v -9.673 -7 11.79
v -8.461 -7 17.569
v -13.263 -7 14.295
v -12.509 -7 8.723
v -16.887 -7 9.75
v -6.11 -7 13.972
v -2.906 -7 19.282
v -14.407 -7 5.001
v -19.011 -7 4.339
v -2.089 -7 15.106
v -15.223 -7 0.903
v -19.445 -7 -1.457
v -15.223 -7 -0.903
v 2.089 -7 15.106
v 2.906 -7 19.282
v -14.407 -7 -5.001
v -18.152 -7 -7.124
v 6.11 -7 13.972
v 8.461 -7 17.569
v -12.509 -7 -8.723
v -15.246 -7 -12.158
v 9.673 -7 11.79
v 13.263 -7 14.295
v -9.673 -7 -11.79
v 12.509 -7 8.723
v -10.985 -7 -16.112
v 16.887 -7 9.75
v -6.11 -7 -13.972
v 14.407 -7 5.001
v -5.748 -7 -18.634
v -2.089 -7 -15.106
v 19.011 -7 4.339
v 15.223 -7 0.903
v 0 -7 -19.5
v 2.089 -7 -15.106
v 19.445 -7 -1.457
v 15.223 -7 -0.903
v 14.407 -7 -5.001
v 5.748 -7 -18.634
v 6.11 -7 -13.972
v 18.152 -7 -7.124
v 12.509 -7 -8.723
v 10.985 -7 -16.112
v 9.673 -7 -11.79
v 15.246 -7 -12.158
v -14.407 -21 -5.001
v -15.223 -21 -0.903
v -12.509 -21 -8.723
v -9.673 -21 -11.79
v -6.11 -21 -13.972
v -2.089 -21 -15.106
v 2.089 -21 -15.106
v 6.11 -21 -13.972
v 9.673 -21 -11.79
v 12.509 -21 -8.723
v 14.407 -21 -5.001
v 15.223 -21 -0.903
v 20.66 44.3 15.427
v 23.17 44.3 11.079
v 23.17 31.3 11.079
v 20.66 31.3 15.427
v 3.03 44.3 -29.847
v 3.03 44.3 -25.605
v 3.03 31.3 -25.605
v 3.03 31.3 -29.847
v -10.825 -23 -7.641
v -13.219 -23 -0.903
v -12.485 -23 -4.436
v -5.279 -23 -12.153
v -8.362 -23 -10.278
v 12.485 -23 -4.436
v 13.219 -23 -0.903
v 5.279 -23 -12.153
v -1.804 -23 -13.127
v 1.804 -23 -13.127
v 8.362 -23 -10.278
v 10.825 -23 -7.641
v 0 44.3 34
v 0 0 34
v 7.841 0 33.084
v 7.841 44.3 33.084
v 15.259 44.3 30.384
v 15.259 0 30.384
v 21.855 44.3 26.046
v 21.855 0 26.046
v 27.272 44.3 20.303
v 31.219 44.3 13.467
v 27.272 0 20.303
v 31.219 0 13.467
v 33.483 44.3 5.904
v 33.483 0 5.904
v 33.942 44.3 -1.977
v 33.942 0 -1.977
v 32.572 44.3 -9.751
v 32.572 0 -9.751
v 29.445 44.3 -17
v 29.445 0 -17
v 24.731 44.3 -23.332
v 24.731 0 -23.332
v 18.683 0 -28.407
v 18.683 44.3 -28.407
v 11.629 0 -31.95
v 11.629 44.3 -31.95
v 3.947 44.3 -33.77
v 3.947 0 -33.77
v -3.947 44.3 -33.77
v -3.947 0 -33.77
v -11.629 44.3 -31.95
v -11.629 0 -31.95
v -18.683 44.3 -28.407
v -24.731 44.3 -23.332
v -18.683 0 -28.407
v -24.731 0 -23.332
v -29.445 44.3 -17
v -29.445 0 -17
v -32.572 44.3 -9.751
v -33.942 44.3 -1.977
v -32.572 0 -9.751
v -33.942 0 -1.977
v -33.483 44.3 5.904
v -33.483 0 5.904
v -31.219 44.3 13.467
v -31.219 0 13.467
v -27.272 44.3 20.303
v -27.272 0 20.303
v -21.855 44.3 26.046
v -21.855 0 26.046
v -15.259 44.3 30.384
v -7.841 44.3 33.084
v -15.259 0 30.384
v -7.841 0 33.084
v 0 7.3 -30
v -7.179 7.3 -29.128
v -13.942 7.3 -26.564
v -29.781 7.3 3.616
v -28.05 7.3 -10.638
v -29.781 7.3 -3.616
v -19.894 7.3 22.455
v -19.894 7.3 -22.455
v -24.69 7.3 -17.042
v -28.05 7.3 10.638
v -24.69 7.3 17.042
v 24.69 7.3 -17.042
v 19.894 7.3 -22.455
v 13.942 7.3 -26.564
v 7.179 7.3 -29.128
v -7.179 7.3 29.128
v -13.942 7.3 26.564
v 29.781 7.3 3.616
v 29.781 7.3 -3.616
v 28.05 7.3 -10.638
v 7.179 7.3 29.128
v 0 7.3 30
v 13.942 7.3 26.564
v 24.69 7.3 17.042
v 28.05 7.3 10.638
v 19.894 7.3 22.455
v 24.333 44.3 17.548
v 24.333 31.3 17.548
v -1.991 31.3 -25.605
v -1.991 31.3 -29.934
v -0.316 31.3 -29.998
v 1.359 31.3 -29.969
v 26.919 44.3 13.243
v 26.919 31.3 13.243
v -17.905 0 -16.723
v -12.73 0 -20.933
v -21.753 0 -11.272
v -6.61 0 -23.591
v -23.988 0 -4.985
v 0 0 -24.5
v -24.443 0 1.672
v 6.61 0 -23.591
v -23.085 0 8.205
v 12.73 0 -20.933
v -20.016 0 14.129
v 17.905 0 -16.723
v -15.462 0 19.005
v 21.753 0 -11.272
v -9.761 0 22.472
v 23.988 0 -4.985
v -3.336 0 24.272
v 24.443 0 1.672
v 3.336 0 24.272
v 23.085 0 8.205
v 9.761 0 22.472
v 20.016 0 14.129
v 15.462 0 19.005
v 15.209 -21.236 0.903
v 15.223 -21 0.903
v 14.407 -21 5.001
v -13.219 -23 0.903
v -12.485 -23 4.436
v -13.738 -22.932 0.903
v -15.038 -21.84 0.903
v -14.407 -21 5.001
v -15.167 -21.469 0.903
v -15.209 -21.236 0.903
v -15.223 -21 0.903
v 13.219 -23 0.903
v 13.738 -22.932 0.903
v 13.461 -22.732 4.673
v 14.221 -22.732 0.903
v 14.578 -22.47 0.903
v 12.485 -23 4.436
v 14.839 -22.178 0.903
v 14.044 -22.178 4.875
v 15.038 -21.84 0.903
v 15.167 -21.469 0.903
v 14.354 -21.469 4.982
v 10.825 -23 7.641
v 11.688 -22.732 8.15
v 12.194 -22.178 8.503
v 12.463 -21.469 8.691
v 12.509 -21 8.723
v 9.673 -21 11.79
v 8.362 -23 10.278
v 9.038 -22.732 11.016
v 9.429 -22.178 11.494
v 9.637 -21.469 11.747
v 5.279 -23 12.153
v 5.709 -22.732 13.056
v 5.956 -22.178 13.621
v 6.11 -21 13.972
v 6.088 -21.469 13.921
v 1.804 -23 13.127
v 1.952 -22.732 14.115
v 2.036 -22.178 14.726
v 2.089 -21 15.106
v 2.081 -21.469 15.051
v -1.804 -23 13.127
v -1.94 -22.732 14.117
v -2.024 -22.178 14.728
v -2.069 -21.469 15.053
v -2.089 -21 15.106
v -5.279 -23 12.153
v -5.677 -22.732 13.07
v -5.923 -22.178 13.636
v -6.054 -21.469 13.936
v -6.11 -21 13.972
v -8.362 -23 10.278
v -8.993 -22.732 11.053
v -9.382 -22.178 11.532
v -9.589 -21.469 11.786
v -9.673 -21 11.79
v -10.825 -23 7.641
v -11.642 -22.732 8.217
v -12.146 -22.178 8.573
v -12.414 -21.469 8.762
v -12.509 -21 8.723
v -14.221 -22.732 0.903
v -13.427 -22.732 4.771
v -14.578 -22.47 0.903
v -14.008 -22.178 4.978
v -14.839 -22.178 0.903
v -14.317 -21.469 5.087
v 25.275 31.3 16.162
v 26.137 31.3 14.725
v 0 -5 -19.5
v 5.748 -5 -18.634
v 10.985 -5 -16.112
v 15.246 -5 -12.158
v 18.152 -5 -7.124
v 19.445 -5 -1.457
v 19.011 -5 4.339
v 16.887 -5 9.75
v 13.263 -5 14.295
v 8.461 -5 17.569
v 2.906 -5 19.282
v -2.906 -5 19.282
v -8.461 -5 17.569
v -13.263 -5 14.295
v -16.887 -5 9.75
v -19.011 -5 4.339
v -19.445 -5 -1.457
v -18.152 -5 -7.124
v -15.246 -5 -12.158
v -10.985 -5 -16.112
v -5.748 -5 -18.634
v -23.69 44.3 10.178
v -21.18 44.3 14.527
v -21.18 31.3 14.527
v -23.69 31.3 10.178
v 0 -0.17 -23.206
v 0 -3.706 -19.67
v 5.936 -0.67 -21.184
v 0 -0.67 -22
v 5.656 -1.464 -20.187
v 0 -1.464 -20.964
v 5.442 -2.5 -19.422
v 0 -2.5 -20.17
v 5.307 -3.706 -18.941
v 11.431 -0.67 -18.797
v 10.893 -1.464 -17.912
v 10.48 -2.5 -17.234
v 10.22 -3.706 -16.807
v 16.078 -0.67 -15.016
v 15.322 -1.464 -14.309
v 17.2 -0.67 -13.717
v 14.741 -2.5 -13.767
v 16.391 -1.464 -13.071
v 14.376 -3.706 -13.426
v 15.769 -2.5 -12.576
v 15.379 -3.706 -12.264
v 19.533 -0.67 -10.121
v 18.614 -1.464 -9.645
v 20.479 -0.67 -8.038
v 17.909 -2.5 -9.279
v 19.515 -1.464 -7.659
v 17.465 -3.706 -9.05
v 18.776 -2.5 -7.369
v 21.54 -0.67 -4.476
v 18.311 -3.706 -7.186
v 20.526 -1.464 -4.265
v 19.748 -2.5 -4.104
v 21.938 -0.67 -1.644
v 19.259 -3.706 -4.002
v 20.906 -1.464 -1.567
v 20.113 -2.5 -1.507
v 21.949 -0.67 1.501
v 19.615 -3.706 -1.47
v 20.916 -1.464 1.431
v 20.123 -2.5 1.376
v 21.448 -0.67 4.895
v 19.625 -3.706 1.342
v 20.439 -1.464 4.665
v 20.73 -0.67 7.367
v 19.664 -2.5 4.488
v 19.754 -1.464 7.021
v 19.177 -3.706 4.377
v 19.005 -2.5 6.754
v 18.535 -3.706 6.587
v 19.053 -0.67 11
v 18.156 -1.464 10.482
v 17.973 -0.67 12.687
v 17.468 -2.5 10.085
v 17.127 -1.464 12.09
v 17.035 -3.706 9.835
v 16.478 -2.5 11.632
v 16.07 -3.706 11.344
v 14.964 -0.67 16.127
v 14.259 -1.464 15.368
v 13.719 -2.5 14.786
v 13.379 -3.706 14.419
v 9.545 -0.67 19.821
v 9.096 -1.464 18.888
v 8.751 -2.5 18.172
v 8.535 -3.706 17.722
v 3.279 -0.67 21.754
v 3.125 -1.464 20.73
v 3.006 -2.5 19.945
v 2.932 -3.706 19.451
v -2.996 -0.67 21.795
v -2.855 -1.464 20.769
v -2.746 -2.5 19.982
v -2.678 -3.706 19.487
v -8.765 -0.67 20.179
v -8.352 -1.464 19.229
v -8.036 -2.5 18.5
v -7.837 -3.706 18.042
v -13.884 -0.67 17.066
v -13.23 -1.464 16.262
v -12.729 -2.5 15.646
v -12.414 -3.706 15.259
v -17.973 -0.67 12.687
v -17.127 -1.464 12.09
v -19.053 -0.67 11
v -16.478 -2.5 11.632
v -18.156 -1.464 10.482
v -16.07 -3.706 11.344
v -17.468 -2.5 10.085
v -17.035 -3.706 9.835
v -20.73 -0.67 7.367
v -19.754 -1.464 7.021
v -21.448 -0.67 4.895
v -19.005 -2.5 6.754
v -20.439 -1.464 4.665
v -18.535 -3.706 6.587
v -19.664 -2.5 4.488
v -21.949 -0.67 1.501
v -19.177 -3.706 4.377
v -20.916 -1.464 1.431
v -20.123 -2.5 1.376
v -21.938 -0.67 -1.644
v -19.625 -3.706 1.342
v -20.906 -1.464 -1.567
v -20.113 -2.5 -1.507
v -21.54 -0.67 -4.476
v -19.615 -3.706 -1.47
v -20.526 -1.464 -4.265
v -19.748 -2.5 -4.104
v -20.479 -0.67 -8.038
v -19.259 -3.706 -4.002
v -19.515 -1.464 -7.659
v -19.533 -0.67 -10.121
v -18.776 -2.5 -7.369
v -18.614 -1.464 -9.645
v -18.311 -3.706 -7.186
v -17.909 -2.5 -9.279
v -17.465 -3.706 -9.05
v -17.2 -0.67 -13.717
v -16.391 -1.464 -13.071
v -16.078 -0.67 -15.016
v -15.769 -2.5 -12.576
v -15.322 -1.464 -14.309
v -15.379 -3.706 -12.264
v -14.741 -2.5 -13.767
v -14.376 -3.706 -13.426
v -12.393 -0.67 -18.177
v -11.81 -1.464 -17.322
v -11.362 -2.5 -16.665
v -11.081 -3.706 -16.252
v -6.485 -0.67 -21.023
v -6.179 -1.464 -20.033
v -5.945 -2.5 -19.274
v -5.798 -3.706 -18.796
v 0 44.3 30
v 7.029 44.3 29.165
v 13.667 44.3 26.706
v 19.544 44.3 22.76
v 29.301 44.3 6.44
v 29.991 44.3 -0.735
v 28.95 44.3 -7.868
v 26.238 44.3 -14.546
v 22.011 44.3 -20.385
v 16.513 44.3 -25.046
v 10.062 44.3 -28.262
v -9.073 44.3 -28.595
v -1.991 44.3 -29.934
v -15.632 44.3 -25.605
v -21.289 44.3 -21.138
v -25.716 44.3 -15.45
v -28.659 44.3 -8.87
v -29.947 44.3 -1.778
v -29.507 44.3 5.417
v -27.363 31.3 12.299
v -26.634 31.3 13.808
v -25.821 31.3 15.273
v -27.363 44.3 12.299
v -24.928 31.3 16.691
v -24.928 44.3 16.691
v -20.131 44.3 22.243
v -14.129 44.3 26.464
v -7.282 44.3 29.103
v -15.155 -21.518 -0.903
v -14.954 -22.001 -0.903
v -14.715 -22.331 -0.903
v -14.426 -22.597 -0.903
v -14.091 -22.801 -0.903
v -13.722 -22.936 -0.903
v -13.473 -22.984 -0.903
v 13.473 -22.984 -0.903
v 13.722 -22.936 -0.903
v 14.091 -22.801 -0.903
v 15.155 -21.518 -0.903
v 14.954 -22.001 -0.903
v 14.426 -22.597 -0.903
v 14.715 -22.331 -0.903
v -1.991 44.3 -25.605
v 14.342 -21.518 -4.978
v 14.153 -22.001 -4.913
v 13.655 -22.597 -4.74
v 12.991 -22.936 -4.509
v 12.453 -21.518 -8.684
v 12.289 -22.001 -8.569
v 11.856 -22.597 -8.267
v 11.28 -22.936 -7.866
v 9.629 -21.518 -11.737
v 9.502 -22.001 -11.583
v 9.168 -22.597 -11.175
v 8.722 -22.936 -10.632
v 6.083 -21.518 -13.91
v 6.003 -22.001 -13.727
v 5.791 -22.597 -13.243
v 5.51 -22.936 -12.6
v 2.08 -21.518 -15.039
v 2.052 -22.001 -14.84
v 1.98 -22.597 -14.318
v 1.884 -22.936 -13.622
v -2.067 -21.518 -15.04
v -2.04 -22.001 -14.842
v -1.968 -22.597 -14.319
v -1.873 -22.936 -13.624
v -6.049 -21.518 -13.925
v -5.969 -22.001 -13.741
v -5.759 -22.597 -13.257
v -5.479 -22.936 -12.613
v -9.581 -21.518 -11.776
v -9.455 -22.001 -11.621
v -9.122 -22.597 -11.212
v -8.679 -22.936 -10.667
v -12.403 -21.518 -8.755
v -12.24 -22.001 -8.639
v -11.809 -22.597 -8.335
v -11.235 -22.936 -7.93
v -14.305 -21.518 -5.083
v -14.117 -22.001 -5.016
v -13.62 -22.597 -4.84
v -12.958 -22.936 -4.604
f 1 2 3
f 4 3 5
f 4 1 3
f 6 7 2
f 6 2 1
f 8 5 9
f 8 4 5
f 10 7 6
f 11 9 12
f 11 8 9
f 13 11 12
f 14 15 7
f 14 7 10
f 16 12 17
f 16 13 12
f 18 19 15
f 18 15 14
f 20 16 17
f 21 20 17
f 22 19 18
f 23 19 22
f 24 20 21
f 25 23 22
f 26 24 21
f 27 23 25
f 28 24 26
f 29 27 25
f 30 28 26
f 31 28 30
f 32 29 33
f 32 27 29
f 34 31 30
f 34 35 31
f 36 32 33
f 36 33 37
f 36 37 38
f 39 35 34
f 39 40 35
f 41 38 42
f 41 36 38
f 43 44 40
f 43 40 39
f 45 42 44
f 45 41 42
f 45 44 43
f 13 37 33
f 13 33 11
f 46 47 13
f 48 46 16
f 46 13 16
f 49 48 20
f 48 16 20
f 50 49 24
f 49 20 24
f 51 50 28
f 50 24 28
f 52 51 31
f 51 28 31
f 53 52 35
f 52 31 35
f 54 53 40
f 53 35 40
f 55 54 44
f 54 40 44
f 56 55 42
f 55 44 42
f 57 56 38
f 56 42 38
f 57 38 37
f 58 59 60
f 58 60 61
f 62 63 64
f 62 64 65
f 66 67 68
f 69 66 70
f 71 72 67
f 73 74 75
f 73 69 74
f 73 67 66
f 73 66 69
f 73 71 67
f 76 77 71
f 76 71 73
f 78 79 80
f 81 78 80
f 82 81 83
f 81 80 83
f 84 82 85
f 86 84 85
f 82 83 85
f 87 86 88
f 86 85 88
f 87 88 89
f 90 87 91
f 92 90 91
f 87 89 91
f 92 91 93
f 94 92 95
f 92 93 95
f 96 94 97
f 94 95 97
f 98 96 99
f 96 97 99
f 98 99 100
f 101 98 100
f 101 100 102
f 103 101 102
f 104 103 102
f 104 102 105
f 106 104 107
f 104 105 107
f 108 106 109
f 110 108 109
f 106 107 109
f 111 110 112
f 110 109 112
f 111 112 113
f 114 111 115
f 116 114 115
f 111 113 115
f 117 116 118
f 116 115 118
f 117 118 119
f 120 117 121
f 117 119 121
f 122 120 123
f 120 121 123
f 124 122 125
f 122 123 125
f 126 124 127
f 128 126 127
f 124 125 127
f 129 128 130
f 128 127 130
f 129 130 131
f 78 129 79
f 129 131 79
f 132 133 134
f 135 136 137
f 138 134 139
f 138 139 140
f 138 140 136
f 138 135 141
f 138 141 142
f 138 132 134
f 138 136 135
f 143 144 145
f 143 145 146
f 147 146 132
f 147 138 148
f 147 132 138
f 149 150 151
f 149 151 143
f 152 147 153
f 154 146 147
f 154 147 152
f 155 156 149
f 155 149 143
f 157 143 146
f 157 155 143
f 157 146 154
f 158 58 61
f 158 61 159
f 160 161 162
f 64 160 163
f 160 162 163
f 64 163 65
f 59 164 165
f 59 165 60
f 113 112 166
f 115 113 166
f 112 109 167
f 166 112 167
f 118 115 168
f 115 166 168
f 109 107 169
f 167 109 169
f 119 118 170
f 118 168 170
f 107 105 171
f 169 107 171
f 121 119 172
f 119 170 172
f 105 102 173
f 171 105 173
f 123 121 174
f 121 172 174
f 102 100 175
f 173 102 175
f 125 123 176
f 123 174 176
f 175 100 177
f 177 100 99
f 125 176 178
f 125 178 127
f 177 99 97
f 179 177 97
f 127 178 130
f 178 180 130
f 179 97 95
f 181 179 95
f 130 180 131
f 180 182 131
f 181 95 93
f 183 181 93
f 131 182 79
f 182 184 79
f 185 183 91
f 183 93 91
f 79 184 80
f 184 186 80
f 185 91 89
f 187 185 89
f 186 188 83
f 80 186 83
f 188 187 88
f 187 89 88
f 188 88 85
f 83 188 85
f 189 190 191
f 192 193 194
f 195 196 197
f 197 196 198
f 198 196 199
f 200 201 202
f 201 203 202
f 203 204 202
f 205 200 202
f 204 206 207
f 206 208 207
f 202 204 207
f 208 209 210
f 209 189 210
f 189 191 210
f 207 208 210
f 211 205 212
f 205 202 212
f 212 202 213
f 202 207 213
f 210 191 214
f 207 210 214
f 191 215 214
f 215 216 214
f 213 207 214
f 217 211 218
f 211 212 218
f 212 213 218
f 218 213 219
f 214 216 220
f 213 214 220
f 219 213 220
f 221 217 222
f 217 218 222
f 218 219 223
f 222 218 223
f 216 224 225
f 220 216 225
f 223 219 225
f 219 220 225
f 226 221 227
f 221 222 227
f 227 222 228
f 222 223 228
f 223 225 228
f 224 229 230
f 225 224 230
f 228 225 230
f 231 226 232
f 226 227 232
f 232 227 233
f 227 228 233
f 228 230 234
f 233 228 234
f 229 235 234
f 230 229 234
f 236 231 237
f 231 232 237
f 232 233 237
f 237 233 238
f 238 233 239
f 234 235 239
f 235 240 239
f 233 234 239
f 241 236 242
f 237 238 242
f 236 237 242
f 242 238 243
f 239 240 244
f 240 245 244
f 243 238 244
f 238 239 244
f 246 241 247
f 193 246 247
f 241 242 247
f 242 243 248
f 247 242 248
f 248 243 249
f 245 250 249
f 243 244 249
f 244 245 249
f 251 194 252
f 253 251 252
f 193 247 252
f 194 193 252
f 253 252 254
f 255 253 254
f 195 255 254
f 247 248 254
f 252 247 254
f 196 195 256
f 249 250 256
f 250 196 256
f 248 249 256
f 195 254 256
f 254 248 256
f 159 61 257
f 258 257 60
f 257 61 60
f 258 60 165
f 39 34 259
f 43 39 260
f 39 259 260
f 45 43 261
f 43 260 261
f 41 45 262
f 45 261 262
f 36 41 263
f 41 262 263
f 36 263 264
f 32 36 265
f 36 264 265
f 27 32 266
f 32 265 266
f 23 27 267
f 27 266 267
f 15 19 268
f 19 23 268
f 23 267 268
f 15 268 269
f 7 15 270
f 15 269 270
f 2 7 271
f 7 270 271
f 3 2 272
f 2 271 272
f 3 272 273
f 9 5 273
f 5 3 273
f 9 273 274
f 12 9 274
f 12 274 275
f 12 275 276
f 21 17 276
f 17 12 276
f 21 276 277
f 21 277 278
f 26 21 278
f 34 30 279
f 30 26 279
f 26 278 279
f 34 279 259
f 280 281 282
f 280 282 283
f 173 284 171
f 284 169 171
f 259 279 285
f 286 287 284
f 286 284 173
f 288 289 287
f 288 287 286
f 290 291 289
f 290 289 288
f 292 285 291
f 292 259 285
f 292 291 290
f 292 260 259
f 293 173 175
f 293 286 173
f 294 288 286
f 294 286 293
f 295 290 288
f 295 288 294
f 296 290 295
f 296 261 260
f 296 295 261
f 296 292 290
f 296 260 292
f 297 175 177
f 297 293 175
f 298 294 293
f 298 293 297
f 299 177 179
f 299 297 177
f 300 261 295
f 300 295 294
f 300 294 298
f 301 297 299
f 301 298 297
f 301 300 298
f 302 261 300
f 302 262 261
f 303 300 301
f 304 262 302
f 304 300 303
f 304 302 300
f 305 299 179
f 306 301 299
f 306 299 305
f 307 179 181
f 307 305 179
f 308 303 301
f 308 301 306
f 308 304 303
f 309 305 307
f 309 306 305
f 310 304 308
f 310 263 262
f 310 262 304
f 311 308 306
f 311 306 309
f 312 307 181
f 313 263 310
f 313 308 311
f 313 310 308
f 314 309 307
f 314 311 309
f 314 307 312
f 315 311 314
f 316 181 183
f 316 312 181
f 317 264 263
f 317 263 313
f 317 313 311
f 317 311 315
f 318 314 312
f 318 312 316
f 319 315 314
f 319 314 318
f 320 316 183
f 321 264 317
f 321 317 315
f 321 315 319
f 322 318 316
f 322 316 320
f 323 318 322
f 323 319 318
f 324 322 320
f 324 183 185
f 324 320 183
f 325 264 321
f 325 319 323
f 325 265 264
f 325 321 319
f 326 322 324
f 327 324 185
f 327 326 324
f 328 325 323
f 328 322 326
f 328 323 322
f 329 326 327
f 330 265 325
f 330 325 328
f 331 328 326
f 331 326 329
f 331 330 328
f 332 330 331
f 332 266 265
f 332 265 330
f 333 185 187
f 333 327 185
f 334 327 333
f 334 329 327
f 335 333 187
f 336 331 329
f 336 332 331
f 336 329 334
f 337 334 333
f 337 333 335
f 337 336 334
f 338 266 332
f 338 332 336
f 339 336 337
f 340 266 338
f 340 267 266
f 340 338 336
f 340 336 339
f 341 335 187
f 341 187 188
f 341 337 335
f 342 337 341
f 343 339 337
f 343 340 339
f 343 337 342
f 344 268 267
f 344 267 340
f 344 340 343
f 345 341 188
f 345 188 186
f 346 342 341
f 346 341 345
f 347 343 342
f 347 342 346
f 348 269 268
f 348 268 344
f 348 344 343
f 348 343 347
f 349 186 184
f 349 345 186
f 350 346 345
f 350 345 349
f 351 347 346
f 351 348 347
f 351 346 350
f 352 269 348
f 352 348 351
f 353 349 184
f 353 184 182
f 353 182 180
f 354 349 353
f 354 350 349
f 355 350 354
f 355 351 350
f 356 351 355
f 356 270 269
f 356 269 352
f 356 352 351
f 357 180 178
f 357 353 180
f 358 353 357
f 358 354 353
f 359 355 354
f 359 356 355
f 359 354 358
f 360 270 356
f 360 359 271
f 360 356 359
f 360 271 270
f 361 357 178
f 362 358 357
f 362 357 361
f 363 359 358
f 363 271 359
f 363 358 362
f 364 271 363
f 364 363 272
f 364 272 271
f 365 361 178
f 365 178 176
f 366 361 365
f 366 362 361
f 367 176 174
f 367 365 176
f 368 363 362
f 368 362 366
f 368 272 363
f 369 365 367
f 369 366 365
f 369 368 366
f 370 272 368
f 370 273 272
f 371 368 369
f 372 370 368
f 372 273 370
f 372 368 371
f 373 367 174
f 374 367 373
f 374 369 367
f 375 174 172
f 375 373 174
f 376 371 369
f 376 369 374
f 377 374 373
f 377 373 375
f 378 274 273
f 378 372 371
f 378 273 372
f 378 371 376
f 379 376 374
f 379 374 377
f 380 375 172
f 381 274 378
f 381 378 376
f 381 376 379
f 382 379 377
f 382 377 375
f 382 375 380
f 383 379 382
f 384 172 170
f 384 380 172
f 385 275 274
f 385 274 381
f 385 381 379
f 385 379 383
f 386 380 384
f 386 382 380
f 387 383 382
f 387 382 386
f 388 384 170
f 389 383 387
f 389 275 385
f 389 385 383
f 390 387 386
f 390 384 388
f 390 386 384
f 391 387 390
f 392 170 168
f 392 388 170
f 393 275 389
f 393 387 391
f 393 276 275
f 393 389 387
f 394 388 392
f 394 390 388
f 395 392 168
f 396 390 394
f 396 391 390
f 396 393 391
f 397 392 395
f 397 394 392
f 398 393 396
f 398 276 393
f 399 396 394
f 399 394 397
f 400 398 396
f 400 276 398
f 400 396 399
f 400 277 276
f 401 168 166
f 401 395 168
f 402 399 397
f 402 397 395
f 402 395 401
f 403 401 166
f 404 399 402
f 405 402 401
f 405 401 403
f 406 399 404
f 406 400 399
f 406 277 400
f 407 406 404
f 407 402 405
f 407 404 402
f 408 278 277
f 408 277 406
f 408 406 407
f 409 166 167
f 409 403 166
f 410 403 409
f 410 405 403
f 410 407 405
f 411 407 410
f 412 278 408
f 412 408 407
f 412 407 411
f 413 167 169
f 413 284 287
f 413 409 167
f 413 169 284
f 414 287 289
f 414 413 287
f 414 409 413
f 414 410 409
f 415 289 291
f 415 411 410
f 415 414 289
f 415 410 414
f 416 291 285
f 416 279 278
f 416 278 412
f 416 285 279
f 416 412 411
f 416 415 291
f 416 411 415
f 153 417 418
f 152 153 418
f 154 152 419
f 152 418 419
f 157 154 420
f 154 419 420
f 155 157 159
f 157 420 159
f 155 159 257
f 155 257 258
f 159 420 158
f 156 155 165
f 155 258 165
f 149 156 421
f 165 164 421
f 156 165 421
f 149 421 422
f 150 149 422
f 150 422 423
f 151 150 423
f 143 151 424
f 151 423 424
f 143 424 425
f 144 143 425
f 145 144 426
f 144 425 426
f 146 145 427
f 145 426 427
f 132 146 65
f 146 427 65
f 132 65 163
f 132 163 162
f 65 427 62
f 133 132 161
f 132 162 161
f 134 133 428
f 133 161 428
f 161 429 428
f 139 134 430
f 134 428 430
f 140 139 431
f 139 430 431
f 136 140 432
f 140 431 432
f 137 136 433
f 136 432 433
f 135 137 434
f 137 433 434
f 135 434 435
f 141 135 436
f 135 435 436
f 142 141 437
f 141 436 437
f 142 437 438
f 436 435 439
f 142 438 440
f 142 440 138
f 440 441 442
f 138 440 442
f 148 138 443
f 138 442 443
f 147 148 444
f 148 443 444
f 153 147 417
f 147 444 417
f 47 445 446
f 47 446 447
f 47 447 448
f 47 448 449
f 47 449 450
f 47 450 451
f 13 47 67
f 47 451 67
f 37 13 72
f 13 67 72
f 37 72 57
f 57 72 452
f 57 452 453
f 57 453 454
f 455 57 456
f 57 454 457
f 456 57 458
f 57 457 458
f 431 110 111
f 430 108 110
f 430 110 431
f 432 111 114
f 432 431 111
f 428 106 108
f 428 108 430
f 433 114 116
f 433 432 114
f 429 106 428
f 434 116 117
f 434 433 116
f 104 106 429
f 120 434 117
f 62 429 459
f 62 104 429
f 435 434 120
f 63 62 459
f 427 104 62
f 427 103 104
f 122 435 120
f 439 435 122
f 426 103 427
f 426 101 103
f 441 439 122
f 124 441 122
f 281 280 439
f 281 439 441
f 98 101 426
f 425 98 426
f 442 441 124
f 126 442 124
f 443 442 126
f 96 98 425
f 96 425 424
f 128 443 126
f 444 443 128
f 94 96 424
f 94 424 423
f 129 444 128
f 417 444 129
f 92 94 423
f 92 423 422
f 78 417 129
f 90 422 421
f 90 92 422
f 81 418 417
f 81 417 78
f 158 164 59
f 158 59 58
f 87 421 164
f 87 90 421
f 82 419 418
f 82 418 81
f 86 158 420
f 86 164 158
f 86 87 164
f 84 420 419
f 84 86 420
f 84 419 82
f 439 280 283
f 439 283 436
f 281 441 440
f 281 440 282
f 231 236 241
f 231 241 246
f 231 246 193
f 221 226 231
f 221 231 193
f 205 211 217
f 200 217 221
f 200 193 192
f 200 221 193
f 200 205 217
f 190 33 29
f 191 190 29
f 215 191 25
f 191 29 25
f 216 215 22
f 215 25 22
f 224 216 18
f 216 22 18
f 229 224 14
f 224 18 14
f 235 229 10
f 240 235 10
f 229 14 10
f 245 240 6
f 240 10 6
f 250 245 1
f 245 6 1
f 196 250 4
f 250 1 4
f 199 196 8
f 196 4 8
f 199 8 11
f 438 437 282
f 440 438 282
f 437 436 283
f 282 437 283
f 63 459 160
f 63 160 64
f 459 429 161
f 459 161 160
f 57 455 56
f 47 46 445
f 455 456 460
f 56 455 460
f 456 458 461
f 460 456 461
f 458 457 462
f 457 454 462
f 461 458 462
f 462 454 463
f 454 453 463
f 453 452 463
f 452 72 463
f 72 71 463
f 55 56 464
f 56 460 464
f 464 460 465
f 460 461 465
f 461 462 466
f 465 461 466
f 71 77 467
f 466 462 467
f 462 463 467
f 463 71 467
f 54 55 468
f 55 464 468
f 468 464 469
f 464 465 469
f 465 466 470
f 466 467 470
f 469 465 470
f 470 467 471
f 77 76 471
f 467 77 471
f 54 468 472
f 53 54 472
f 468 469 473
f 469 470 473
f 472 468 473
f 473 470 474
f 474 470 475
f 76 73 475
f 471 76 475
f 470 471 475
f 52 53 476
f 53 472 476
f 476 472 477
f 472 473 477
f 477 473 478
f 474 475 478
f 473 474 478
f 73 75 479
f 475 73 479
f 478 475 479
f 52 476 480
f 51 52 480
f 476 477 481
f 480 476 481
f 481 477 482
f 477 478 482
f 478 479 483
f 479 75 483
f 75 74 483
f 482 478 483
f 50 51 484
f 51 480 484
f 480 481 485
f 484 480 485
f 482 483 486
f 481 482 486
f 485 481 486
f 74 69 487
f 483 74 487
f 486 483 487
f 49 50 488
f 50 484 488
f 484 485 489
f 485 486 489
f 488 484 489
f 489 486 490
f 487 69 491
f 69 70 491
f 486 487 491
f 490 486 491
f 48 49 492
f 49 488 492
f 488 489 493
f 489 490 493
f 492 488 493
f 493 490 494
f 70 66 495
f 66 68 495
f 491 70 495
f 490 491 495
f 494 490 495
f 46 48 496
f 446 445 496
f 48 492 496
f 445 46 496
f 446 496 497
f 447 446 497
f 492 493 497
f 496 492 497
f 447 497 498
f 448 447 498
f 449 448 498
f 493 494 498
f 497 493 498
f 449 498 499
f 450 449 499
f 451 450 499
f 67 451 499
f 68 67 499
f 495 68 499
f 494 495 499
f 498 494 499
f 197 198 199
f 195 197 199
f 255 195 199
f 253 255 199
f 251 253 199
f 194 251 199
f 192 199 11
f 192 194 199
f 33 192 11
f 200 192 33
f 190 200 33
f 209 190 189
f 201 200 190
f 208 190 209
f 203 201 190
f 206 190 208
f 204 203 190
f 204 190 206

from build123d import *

# Parameters (mm, degrees)
SKETCH1_R           = 34
BOSS_EXTRUDE1_DEPTH = 44.3
SKETCH2_R           = 30
CUT_EXTRUDE1_DEPTH  = 37
SKETCH3_R           = 19.5
BOSS_EXTRUDE2_DEPTH = 7
SKETCH4_R           = 15.25
BOSS_EXTRUDE3_DEPTH = 16
FILLET1_R           = 5
BOSS_EXTRUDE4_DEPTH = 13
SKETCH7_W           = 66.193685288
SKETCH7_H           = 1.806726502
CUT_EXTRUDE2_DEPTH  = 16
FILLET2_R           = 2


with BuildPart() as part:
    # Sketch1 → Boss-Extrude1 (new body)
    with BuildSketch(Plane(origin=(0, 0, 0), x_dir=(1, 0, 0), z_dir=(0, 1, 0))):
        with Locations(Location((0, 0, 0), (0, 0, 270))):
            Circle(SKETCH1_R)
    extrude(amount=BOSS_EXTRUDE1_DEPTH)

    # Sketch2 → Cut-Extrude1 (cut)
    with BuildSketch(Plane(origin=(0, 44.3, 0), x_dir=(1, 0, 0), z_dir=(0, 1, 0))):
        with Locations(Location((0, 0, 0), (0, 0, 270))):
            Circle(SKETCH2_R)
    extrude(amount=-CUT_EXTRUDE1_DEPTH, mode=Mode.SUBTRACT)

    # Sketch3 → Boss-Extrude2 (add)
    with BuildSketch(Plane.XZ):
        with Locations(Location((0, 0, 0), (0, 0, 270))):
            Circle(SKETCH3_R)
    extrude(amount=BOSS_EXTRUDE2_DEPTH)

    # Sketch4 → Boss-Extrude3 (add)
    with BuildSketch(Plane.XZ.offset(7)):
        with Locations(Location((0, 0, 0), (0, 0, 270))):
            Circle(SKETCH4_R)
    extrude(amount=BOSS_EXTRUDE3_DEPTH)

    # Fillet1
    fillet1_edges = [part.edges().sort_by_distance(p)[0] for p in [
        (0, 0, 19.5),
    ]]
    fillet(fillet1_edges, radius=FILLET1_R)

    # Sketch5 → Boss-Extrude4 (add)
    with BuildSketch(Plane(origin=(0, 44.3, 0), x_dir=(1, 0, 0), z_dir=(0, 1, 0))):
        with BuildLine():
            Line((-1.990534123, 29.933890056), (-1.990534123, 25.605317076))
            Line((-1.990534123, 25.605317076), (3.030233114, 25.605317076))
            Line((3.030233114, 25.605317076), (3.030233114, 29.846569104))
            ThreePointArc((3.030233114, 29.846569104), (0.521679725, 29.995463828), (-1.990534123, 29.933890056))
        make_face()
        with BuildLine():
            Line((26.918776284, -13.243091911), (23.170122121, -11.07880542))
            Line((23.170122121, -11.07880542), (20.659738503, -15.426917394))
            Line((20.659738503, -15.426917394), (24.332770503, -17.547543408))
            ThreePointArc((24.332770503, -17.547543408), (25.715993811, -15.449519808), (26.918776284, -13.243091911))
        make_face()
        with BuildLine():
            Line((-24.928242161, -16.690798146), (-21.179587998, -14.526511655))
            Line((-21.179587998, -14.526511655), (-23.689971616, -10.178399682))
            Line((-23.689971616, -10.178399682), (-27.363003617, -12.299025696))
            ThreePointArc((-27.363003617, -12.299025696), (-26.237673536, -14.54594402), (-24.928242161, -16.690798146))
        make_face()
    extrude(amount=-BOSS_EXTRUDE4_DEPTH)

    # Sketch7 → Cut-Extrude2 (cut)
    with BuildSketch(Plane.XZ.offset(23)):
        Rectangle(SKETCH7_W, SKETCH7_H)
    extrude(amount=-CUT_EXTRUDE2_DEPTH, mode=Mode.SUBTRACT)

    # Fillet2
    fillet2_edges = [part.edges().sort_by_distance(p)[0] for p in [
        (0, -23, 15.25),
        (0, -23, -15.25),
    ]]
    fillet(fillet2_edges, radius=FILLET2_R)


solid = part.part
